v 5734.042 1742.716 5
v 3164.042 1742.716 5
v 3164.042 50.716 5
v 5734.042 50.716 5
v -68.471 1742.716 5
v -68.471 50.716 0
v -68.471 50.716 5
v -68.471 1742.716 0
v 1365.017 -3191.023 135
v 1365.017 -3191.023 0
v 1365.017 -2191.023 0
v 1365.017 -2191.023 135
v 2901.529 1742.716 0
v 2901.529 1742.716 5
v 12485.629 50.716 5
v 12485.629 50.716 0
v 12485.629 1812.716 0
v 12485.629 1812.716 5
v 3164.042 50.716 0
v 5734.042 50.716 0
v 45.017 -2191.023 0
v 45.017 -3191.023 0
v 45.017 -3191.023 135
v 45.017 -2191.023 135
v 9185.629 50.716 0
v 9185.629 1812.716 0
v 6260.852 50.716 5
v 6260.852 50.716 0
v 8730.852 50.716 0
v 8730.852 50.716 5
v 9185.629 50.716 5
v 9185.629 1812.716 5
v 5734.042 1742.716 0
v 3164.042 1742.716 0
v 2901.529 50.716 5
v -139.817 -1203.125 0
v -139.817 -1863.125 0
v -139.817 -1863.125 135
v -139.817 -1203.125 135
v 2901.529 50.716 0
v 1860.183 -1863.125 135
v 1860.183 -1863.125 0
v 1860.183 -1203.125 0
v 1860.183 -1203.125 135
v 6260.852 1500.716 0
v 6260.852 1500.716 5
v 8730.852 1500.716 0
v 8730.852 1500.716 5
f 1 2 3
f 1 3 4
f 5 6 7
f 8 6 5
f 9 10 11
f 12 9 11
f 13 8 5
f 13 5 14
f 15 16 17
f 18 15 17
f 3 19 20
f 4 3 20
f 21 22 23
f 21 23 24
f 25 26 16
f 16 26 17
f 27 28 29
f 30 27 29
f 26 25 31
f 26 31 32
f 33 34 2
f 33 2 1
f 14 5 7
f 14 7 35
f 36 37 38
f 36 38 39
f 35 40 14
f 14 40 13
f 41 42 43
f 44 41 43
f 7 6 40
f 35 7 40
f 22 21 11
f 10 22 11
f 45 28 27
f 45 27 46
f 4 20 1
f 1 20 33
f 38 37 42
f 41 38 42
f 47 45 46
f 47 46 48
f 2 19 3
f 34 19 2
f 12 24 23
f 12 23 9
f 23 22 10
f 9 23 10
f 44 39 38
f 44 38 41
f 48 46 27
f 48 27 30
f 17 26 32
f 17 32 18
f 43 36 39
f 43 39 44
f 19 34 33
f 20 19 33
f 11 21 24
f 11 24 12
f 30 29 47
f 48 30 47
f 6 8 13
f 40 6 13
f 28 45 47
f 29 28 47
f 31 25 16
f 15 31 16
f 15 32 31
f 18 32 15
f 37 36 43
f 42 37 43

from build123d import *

# Parameters (mm, degrees)
F0_W     = 2970
F0_H     = 1692
F1_DEPTH = 5
F0_W_2   = 2570
F0_W_3   = 2470
F0_H_2   = 1450
F0_W_4   = 3300
F0_H_3   = 1762
F0_W_5   = 2000
F0_H_4   = 660
F2_DEPTH = 135
F0_W_6   = 1320
F0_H_5   = 1000


with BuildPart() as f1:
    # F0 (on Top) → F1 (new body)
    with BuildSketch(Plane.XY):
        with Locations((1416.5291196108, 896.7160201669)):
            Rectangle(F0_W, F0_H)
    extrude(amount=F1_DEPTH)


with BuildPart() as f1b:
    # F0 (on Top) → F1, piece 2 (new body)
    with BuildSketch(Plane.XY):
        with Locations((4449.041519165, 896.7160201669)):
            Rectangle(F0_W_2, F0_H)
    extrude(amount=F1_DEPTH)


with BuildPart() as f1c:
    # F0 (on Top) → F1, piece 3 (new body)
    with BuildSketch(Plane.XY):
        with Locations((7495.8523368835, 775.7160201669)):
            Rectangle(F0_W_3, F0_H_2)
    extrude(amount=F1_DEPTH)


with BuildPart() as f1d:
    # F0 (on Top) → F1, piece 4 (new body)
    with BuildSketch(Plane.XY):
        with Locations((10835.6288909912, 931.7160201669)):
            Rectangle(F0_W_4, F0_H_3)
    extrude(amount=F1_DEPTH)


with BuildPart() as f2:
    # F0 (on Top) → F2 (new body)
    with BuildSketch(Plane.XY):
        with Locations((860.1830005646, -1533.1247282028)):
            Rectangle(F0_W_5, F0_H_4)
    extrude(amount=F2_DEPTH)


with BuildPart() as f2b:
    # F0 (on Top) → F2, piece 2 (new body)
    with BuildSketch(Plane.XY):
        with Locations((705.0170564651, -2691.0228729248)):
            Rectangle(F0_W_6, F0_H_5)
    extrude(amount=F2_DEPTH)


solid = Compound([f1.part, f1b.part, f1c.part, f1d.part, f2.part, f2b.part])
